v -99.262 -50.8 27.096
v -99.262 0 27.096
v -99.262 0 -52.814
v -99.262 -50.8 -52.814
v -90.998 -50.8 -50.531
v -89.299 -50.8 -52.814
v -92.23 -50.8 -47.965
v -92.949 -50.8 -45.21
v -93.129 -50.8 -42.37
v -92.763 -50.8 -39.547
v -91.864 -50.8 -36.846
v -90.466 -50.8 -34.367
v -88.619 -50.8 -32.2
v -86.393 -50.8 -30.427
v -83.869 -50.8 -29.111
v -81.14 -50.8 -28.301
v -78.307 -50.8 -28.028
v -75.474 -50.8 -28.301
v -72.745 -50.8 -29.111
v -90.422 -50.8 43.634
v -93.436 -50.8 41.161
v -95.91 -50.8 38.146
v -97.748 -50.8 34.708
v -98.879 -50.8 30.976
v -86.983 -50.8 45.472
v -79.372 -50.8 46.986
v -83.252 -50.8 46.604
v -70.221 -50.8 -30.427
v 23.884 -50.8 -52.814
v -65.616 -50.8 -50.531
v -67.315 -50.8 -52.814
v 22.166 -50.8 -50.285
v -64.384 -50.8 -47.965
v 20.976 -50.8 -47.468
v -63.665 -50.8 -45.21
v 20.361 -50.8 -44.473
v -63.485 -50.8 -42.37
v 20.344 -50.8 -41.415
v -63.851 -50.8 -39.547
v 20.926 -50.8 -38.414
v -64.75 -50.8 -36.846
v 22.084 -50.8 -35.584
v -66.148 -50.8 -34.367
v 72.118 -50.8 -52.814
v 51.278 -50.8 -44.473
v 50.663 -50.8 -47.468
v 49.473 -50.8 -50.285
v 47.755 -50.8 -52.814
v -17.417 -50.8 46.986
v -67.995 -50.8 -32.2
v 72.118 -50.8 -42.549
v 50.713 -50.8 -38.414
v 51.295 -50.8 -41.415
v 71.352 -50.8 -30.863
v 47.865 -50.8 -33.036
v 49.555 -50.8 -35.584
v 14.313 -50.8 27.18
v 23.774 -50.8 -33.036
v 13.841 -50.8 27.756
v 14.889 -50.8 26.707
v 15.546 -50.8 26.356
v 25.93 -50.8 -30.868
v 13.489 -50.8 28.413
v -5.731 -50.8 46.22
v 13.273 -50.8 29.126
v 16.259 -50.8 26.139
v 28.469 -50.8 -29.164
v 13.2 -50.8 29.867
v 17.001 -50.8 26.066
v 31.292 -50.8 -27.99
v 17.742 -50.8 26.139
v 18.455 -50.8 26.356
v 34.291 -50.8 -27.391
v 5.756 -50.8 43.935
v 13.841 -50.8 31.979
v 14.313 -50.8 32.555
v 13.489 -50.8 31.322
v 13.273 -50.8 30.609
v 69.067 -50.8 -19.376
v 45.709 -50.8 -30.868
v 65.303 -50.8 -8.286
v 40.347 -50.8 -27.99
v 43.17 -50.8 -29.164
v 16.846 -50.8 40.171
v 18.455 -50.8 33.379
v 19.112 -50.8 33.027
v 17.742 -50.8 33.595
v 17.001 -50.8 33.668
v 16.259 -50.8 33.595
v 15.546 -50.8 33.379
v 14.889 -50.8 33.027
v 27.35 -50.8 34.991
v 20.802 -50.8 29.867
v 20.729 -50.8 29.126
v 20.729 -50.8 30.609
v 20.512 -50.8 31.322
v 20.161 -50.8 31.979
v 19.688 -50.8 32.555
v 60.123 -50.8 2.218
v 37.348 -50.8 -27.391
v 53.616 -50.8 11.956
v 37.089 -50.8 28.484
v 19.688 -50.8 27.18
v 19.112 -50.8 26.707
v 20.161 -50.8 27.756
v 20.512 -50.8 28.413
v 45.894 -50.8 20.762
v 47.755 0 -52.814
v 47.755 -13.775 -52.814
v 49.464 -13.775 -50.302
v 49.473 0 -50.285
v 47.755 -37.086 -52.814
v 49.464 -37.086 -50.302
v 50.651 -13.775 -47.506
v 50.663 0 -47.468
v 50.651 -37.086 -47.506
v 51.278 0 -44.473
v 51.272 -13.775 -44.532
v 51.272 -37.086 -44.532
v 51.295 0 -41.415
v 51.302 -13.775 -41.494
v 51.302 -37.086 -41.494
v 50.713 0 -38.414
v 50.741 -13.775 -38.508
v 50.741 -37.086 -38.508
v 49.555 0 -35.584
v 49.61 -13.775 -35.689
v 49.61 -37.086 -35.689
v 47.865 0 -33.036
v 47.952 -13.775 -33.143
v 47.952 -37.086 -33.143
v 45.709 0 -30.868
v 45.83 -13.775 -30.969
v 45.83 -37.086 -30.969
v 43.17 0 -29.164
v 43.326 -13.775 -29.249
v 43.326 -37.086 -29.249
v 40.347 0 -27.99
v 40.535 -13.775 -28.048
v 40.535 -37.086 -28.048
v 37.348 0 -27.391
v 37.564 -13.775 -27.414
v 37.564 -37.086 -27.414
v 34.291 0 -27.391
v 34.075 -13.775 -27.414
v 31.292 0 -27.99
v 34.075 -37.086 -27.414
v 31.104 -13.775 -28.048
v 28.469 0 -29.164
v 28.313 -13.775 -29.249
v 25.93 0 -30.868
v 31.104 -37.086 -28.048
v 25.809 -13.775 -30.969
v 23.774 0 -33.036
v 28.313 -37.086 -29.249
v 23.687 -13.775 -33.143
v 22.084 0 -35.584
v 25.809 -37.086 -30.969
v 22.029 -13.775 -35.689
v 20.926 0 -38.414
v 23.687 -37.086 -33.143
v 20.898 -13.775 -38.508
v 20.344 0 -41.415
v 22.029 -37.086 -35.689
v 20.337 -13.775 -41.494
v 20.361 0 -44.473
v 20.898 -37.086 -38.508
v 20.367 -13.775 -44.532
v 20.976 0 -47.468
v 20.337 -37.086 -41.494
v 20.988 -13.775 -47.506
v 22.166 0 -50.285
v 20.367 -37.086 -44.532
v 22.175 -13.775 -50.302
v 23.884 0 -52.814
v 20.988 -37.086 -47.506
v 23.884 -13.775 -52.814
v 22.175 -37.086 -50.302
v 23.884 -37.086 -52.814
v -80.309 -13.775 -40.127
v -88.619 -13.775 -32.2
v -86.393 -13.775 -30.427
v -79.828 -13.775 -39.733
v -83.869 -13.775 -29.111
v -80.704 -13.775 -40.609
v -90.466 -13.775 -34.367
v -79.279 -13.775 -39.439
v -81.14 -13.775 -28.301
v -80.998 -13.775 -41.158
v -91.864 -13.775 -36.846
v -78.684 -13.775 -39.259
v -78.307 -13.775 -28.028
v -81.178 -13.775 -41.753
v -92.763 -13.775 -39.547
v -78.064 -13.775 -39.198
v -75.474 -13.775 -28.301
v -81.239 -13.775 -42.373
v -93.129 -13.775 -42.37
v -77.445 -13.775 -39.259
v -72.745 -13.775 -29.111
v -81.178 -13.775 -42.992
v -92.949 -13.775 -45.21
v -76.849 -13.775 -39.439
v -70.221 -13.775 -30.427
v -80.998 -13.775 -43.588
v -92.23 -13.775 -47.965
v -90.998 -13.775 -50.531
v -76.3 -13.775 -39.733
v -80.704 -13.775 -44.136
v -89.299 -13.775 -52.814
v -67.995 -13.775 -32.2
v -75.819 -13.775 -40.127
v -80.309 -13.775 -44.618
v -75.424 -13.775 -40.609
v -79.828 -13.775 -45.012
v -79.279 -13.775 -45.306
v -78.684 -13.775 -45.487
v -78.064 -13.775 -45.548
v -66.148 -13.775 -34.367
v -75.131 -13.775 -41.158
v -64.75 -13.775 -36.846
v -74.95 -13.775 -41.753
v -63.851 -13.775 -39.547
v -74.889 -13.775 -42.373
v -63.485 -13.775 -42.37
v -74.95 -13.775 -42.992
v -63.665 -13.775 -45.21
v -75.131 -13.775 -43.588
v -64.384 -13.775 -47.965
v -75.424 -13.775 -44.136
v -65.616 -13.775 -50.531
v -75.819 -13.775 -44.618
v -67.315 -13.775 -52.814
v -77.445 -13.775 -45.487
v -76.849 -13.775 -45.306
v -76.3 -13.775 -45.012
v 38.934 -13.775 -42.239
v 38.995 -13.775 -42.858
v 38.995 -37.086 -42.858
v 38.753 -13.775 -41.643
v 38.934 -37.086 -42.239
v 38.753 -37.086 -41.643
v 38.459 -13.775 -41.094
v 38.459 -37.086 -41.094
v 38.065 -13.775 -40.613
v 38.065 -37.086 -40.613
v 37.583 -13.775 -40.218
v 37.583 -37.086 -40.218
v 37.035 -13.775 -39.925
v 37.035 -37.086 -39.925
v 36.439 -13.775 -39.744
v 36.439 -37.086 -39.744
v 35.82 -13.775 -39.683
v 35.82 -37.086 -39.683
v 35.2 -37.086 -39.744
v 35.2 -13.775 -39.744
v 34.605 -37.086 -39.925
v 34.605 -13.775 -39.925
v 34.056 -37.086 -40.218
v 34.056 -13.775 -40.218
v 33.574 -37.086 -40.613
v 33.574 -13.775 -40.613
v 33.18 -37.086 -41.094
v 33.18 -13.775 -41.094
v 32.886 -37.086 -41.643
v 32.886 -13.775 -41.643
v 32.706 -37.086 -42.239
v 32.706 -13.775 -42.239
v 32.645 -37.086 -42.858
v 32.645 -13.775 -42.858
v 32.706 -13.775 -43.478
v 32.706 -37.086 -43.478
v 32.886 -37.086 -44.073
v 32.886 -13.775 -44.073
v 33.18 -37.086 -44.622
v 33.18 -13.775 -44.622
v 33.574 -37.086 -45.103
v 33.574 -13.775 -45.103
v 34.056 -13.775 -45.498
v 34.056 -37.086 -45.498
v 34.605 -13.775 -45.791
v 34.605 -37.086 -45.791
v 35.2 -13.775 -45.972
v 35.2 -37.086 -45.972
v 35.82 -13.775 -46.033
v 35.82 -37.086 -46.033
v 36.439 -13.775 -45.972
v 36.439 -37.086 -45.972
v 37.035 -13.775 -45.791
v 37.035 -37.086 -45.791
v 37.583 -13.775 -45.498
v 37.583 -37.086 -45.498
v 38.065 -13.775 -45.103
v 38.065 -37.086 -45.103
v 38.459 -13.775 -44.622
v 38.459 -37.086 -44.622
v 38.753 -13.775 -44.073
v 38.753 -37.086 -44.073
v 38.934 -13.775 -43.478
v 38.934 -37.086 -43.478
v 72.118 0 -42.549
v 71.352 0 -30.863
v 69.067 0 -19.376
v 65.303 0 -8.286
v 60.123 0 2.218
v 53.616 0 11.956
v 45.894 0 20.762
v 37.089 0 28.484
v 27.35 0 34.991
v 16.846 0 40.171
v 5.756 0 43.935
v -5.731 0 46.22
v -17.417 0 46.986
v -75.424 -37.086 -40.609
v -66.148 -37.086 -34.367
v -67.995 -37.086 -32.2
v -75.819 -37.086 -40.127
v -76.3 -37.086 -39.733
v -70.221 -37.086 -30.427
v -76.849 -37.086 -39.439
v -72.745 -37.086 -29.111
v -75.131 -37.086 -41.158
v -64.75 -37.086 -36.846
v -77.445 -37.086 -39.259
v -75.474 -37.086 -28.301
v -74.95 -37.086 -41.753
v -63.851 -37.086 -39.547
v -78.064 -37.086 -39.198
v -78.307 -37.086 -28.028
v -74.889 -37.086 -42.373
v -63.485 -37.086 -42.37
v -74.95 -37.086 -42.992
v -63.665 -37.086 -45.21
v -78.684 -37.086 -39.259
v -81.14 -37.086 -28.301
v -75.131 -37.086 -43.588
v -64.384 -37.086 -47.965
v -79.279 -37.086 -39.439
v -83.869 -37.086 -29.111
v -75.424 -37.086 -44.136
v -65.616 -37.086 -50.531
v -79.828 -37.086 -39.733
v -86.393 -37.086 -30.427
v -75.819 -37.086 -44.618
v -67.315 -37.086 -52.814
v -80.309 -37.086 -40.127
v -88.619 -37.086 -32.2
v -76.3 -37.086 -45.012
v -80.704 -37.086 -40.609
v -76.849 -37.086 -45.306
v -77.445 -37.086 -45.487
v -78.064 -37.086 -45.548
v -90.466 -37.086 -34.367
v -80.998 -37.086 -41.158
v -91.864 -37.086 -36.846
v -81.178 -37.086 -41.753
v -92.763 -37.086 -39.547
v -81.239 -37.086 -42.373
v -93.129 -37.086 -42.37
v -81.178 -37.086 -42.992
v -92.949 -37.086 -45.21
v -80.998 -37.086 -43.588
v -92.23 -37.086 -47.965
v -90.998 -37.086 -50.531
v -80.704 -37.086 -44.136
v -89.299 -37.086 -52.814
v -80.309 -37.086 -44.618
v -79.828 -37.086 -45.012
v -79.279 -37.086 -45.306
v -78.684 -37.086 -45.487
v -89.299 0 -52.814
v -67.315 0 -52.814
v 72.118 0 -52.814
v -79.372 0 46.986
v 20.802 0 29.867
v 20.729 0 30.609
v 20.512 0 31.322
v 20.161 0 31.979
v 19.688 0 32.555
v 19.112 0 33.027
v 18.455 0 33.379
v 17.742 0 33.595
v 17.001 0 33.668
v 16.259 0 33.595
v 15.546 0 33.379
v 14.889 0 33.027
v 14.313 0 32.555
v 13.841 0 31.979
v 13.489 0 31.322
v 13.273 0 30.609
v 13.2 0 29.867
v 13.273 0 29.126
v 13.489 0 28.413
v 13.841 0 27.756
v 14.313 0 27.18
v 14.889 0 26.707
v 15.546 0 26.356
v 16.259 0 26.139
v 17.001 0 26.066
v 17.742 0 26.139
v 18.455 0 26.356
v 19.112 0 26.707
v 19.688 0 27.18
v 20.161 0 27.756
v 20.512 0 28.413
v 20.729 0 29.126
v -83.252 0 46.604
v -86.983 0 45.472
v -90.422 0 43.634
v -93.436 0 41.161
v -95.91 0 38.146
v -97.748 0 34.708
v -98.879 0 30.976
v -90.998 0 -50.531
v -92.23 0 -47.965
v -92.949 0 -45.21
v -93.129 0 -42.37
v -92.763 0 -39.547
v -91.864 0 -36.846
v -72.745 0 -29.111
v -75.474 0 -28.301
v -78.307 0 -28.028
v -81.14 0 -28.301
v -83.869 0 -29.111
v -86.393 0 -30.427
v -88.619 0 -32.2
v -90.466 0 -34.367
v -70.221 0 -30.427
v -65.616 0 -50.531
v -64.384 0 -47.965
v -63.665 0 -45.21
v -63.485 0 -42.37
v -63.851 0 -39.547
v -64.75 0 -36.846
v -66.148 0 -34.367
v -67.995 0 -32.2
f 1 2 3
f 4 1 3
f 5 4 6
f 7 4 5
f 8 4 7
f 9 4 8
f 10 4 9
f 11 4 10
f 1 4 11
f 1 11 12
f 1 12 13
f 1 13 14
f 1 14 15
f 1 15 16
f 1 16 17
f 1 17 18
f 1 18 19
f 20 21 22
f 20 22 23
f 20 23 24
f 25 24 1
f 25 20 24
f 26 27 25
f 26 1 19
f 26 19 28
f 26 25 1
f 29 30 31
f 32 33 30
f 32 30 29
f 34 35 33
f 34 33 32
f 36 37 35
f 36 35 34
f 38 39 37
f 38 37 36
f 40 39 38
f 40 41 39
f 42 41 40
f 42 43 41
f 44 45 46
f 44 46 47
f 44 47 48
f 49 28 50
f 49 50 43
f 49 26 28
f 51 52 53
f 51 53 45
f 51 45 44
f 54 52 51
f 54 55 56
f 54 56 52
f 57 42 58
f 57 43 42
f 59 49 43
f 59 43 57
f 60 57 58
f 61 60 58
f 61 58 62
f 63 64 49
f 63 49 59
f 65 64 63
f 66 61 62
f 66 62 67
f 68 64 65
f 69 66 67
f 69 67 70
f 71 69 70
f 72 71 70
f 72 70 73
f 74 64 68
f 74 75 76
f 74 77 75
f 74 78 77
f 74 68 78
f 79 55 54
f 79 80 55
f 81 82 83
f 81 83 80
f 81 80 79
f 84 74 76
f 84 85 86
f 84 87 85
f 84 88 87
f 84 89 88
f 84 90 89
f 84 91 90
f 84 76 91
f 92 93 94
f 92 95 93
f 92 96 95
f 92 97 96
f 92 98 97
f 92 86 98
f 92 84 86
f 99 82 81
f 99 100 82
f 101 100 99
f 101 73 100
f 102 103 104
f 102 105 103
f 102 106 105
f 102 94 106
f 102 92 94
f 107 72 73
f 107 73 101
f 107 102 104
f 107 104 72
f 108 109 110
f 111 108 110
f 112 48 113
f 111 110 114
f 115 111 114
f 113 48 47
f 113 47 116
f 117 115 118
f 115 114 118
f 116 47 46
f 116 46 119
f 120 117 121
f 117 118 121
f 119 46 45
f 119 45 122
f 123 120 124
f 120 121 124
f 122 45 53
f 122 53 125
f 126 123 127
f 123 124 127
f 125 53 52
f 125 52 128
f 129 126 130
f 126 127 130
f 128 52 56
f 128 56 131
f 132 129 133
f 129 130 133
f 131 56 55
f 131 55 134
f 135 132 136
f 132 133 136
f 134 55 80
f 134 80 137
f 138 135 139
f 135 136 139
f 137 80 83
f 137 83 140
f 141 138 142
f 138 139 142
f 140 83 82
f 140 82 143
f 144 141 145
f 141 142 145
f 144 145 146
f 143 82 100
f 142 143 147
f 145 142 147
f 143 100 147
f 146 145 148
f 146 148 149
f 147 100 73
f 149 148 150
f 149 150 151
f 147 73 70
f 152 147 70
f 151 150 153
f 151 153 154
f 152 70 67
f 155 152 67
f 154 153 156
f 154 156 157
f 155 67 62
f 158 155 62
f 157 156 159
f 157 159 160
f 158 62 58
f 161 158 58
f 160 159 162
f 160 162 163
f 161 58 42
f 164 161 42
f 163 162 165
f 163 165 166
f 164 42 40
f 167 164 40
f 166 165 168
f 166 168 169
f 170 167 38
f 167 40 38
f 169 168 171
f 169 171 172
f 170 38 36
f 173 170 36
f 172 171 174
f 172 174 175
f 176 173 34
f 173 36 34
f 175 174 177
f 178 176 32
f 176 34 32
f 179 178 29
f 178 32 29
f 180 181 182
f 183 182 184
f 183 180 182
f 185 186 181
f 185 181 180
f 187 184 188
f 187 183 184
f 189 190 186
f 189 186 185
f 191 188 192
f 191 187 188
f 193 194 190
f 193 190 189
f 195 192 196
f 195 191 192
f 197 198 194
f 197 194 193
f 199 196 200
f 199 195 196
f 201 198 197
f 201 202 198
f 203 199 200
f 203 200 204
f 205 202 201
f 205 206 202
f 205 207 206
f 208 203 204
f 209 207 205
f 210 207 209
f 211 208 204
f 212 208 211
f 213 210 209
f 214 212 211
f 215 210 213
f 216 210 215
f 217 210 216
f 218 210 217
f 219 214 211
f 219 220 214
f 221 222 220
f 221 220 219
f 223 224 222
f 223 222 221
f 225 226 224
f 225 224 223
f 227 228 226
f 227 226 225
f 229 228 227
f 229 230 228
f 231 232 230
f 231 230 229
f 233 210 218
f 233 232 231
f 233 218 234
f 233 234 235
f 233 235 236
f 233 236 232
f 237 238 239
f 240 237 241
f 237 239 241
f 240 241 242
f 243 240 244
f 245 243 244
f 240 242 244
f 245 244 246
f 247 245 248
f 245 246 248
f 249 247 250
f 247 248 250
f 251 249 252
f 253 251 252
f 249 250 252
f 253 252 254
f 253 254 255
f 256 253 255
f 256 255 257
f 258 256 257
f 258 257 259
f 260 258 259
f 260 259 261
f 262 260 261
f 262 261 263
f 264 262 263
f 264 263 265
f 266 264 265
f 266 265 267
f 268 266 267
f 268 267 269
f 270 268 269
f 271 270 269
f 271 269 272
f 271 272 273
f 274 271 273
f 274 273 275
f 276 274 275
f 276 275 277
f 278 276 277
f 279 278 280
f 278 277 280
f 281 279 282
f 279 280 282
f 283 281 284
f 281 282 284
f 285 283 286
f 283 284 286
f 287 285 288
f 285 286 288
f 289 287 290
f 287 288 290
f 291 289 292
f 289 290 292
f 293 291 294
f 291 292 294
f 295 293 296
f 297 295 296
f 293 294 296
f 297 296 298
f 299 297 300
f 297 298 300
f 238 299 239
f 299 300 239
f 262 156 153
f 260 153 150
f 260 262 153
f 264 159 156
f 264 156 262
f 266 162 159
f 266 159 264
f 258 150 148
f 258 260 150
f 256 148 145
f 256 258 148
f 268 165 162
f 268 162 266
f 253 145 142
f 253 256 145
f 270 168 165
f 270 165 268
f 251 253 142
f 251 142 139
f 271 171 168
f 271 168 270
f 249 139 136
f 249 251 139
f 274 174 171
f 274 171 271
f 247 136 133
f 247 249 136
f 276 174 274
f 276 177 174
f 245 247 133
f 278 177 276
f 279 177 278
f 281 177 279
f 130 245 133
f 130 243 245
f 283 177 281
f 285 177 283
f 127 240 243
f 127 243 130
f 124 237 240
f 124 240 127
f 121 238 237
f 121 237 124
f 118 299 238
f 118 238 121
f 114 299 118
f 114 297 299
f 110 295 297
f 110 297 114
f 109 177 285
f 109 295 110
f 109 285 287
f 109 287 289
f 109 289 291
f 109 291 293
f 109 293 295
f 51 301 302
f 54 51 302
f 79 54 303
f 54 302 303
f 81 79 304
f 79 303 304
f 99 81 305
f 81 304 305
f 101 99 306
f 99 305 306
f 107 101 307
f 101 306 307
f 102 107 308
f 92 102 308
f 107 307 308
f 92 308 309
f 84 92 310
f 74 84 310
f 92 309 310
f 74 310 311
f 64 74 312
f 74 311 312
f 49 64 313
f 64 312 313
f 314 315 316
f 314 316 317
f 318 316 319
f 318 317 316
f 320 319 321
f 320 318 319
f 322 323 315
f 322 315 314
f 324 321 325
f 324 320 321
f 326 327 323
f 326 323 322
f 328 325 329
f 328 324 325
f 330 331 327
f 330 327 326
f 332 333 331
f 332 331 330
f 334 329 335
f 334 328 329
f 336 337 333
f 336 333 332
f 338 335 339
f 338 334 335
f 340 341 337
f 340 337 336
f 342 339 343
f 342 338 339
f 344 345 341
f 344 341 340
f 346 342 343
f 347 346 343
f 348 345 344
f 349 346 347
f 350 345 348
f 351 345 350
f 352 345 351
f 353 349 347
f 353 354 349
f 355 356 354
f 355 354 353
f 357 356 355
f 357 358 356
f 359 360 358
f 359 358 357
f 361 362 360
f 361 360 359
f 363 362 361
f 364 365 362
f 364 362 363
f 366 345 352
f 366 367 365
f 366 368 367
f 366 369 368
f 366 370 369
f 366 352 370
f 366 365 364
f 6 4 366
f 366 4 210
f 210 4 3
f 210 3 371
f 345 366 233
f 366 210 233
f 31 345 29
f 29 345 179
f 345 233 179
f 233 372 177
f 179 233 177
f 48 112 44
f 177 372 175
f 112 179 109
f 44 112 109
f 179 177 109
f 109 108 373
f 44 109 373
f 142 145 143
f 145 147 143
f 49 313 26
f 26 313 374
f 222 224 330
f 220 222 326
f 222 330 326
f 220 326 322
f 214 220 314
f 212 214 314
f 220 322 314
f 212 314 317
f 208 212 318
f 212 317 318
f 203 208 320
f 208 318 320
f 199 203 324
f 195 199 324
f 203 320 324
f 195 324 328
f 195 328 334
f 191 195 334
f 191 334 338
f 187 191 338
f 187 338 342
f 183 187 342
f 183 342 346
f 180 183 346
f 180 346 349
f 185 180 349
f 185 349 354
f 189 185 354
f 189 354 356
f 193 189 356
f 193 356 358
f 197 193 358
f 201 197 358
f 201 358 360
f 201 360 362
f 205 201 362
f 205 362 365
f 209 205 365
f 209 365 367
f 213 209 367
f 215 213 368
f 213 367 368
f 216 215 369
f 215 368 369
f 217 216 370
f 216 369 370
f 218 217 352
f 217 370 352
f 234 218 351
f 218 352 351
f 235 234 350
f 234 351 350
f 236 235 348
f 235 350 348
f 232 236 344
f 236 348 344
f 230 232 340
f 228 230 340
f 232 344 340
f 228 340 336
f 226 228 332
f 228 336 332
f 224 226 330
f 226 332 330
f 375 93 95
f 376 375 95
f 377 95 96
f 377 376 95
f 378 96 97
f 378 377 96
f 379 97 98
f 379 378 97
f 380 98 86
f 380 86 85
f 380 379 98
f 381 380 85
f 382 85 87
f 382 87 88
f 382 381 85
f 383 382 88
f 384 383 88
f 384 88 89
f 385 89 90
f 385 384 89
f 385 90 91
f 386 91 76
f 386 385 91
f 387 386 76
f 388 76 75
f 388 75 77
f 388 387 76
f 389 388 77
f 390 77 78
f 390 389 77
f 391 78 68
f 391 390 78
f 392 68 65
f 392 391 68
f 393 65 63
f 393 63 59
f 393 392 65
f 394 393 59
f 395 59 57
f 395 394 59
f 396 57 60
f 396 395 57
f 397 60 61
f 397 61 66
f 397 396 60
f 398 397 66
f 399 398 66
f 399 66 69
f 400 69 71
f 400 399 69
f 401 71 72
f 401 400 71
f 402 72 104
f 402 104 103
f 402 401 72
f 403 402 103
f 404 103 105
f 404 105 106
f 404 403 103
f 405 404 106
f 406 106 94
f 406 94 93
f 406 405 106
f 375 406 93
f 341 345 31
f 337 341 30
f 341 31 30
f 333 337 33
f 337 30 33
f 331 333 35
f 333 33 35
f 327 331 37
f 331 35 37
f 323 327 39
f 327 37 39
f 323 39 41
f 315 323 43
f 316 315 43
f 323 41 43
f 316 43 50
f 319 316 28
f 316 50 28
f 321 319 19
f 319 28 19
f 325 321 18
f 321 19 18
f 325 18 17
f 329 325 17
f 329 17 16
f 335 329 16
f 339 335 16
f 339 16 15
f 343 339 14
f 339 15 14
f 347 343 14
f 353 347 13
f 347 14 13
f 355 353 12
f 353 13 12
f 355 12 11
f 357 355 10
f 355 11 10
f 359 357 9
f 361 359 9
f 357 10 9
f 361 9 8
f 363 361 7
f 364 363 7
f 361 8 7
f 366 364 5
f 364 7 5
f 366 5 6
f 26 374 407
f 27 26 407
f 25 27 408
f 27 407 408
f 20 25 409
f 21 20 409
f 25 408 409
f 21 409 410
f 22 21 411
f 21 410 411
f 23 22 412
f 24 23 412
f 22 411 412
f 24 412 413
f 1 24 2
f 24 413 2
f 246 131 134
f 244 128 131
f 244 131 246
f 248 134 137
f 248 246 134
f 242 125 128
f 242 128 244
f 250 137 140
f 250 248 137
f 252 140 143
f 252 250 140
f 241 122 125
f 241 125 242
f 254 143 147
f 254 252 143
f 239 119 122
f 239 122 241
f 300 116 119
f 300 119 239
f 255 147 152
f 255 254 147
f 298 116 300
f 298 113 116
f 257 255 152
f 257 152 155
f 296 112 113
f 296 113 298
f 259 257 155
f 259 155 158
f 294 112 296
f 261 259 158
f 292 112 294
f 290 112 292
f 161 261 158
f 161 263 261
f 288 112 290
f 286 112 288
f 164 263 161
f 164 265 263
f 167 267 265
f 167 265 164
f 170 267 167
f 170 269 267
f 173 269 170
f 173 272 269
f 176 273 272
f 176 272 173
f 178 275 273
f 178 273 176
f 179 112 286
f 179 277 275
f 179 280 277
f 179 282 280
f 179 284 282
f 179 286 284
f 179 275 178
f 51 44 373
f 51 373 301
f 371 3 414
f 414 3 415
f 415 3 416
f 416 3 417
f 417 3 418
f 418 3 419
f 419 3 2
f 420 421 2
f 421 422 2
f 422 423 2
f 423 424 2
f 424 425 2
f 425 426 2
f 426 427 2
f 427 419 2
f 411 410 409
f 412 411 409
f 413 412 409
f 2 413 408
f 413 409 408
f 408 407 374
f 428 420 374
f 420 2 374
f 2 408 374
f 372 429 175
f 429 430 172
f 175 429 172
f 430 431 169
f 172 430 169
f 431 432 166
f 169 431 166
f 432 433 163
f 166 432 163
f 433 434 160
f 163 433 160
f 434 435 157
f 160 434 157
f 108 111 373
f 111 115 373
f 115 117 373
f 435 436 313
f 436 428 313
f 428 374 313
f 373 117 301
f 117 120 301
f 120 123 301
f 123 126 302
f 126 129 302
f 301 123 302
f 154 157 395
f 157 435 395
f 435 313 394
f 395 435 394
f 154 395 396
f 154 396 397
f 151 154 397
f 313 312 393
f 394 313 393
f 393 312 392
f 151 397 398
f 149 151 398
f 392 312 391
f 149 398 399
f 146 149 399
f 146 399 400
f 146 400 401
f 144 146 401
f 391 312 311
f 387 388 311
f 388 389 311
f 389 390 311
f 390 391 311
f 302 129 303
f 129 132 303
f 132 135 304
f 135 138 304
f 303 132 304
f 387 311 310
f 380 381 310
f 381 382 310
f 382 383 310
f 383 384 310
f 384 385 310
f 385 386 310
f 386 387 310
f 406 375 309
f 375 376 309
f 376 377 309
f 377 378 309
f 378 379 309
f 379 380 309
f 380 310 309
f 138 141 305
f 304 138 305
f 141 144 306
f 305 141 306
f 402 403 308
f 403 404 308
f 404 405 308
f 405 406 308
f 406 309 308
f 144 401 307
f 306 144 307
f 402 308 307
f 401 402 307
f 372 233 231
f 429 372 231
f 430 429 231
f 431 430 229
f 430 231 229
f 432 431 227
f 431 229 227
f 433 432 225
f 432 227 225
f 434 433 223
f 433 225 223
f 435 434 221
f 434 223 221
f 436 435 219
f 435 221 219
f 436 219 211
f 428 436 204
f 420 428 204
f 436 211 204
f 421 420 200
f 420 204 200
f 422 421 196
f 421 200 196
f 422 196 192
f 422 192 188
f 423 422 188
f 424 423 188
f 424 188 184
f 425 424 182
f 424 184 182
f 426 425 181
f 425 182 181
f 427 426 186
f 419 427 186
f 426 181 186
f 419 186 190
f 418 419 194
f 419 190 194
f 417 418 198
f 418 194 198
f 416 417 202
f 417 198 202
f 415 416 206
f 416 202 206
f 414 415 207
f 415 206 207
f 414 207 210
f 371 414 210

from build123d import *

# Parameters (mm, degrees)
F0_R     = 3.800771
F1_DEPTH = 50.8
F3_D     = 6.35
F2_R     = 14.830071
F2_R_2   = 15.542538
F4_DEPTH = 50.8
F6_DEPTH = 25.4
F8_D     = 6.35
F9_D     = 6.35


with BuildPart() as f1:
    # F0 (on Front) → F1 (new body)
    with BuildSketch(Plane.XZ):
        with BuildLine():
            Line((-17.417282, 46.986144), (-79.371665, 46.986144))
            ThreePointArc((-79.371665, 46.986144), (-93.436013, 41.160501), (-99.261656, 27.096153))
            Line((-99.261656, 27.096153), (-99.261656, -52.813884))
            Line((-99.261656, -52.813884), (72.118267, -52.813884))
            Line((72.118267, -52.813884), (72.118267, -42.549405))
            ThreePointArc((72.118267, -42.549405), (45.893912, 20.761789), (-17.417282, 46.986144))
        make_face()
        with Locations((17.000813, 29.867163)):
            Circle(F0_R, mode=Mode.SUBTRACT)
    extrude(amount=F1_DEPTH)

    # F3 (through all)
    with Locations(Plane.XZ.offset(50.8)):
        with Locations((-78.307003, -42.858165), (35.819549, -42.858165)):
            Hole(F3_D / 2)

    # F2 (on face) → F4 (cut)
    with BuildSketch(Plane.XZ.offset(50.8)):
        with Locations((-78.307003, -42.858165)):
            Circle(F2_R)
        with Locations((35.819549, -42.858165)):
            Circle(F2_R_2)
    extrude(amount=-F4_DEPTH, mode=Mode.SUBTRACT)

    # F5 (on face) → F6 (join)
    with BuildSketch(Plane(origin=(0, 0, -52.813884), x_dir=(1, 0, 0), z_dir=(0, 0, -1))):
        Polygon((23.884133, 22.274217), (23.884133, 18.090272), (23.884133, 13.775429), (55.002525, 13.775429), (55.002525, 37.086386), (23.884133, 37.086386), (23.884133, 35.816312), align=None)
        Polygon((9.837548, 22.274217), (23.884133, 22.274217), (23.884133, 35.816312), (23.884133, 37.086386), (9.837548, 37.086386), align=None)
        Polygon((23.884133, 13.775429), (23.884133, 18.090272), (23.884133, 22.274217), (9.837548, 22.274217), (9.837548, 13.775429), align=None)
        Polygon((-67.315431, 17.847452), (-67.315431, 13.775429), (-54.996047, 13.775429), (-54.996047, 37.086386), (-67.315431, 37.086386), (-67.315431, 35.087846), align=None)
        Polygon((-96.761517, 13.775429), (-67.315431, 13.775429), (-67.315431, 17.847452), (-67.315431, 35.087846), (-67.315431, 37.086386), (-96.761517, 37.086386), align=None)
    extrude(amount=-F6_DEPTH)

    # F8 (through all)
    with Locations(Plane(origin=(0, -13.775429, 0), x_dir=(-1, 0, 0), z_dir=(0, 1, 0))):
        with Locations((-35.819549, -42.858165)):
            Hole(F8_D / 2)

    # F9 (through all)
    with Locations(Plane(origin=(0, -13.775429, 0), x_dir=(-1, 0, 0), z_dir=(0, 1, 0))):
        with Locations((78.064188, -42.372521)):
            Hole(F9_D / 2)


solid = f1.part
